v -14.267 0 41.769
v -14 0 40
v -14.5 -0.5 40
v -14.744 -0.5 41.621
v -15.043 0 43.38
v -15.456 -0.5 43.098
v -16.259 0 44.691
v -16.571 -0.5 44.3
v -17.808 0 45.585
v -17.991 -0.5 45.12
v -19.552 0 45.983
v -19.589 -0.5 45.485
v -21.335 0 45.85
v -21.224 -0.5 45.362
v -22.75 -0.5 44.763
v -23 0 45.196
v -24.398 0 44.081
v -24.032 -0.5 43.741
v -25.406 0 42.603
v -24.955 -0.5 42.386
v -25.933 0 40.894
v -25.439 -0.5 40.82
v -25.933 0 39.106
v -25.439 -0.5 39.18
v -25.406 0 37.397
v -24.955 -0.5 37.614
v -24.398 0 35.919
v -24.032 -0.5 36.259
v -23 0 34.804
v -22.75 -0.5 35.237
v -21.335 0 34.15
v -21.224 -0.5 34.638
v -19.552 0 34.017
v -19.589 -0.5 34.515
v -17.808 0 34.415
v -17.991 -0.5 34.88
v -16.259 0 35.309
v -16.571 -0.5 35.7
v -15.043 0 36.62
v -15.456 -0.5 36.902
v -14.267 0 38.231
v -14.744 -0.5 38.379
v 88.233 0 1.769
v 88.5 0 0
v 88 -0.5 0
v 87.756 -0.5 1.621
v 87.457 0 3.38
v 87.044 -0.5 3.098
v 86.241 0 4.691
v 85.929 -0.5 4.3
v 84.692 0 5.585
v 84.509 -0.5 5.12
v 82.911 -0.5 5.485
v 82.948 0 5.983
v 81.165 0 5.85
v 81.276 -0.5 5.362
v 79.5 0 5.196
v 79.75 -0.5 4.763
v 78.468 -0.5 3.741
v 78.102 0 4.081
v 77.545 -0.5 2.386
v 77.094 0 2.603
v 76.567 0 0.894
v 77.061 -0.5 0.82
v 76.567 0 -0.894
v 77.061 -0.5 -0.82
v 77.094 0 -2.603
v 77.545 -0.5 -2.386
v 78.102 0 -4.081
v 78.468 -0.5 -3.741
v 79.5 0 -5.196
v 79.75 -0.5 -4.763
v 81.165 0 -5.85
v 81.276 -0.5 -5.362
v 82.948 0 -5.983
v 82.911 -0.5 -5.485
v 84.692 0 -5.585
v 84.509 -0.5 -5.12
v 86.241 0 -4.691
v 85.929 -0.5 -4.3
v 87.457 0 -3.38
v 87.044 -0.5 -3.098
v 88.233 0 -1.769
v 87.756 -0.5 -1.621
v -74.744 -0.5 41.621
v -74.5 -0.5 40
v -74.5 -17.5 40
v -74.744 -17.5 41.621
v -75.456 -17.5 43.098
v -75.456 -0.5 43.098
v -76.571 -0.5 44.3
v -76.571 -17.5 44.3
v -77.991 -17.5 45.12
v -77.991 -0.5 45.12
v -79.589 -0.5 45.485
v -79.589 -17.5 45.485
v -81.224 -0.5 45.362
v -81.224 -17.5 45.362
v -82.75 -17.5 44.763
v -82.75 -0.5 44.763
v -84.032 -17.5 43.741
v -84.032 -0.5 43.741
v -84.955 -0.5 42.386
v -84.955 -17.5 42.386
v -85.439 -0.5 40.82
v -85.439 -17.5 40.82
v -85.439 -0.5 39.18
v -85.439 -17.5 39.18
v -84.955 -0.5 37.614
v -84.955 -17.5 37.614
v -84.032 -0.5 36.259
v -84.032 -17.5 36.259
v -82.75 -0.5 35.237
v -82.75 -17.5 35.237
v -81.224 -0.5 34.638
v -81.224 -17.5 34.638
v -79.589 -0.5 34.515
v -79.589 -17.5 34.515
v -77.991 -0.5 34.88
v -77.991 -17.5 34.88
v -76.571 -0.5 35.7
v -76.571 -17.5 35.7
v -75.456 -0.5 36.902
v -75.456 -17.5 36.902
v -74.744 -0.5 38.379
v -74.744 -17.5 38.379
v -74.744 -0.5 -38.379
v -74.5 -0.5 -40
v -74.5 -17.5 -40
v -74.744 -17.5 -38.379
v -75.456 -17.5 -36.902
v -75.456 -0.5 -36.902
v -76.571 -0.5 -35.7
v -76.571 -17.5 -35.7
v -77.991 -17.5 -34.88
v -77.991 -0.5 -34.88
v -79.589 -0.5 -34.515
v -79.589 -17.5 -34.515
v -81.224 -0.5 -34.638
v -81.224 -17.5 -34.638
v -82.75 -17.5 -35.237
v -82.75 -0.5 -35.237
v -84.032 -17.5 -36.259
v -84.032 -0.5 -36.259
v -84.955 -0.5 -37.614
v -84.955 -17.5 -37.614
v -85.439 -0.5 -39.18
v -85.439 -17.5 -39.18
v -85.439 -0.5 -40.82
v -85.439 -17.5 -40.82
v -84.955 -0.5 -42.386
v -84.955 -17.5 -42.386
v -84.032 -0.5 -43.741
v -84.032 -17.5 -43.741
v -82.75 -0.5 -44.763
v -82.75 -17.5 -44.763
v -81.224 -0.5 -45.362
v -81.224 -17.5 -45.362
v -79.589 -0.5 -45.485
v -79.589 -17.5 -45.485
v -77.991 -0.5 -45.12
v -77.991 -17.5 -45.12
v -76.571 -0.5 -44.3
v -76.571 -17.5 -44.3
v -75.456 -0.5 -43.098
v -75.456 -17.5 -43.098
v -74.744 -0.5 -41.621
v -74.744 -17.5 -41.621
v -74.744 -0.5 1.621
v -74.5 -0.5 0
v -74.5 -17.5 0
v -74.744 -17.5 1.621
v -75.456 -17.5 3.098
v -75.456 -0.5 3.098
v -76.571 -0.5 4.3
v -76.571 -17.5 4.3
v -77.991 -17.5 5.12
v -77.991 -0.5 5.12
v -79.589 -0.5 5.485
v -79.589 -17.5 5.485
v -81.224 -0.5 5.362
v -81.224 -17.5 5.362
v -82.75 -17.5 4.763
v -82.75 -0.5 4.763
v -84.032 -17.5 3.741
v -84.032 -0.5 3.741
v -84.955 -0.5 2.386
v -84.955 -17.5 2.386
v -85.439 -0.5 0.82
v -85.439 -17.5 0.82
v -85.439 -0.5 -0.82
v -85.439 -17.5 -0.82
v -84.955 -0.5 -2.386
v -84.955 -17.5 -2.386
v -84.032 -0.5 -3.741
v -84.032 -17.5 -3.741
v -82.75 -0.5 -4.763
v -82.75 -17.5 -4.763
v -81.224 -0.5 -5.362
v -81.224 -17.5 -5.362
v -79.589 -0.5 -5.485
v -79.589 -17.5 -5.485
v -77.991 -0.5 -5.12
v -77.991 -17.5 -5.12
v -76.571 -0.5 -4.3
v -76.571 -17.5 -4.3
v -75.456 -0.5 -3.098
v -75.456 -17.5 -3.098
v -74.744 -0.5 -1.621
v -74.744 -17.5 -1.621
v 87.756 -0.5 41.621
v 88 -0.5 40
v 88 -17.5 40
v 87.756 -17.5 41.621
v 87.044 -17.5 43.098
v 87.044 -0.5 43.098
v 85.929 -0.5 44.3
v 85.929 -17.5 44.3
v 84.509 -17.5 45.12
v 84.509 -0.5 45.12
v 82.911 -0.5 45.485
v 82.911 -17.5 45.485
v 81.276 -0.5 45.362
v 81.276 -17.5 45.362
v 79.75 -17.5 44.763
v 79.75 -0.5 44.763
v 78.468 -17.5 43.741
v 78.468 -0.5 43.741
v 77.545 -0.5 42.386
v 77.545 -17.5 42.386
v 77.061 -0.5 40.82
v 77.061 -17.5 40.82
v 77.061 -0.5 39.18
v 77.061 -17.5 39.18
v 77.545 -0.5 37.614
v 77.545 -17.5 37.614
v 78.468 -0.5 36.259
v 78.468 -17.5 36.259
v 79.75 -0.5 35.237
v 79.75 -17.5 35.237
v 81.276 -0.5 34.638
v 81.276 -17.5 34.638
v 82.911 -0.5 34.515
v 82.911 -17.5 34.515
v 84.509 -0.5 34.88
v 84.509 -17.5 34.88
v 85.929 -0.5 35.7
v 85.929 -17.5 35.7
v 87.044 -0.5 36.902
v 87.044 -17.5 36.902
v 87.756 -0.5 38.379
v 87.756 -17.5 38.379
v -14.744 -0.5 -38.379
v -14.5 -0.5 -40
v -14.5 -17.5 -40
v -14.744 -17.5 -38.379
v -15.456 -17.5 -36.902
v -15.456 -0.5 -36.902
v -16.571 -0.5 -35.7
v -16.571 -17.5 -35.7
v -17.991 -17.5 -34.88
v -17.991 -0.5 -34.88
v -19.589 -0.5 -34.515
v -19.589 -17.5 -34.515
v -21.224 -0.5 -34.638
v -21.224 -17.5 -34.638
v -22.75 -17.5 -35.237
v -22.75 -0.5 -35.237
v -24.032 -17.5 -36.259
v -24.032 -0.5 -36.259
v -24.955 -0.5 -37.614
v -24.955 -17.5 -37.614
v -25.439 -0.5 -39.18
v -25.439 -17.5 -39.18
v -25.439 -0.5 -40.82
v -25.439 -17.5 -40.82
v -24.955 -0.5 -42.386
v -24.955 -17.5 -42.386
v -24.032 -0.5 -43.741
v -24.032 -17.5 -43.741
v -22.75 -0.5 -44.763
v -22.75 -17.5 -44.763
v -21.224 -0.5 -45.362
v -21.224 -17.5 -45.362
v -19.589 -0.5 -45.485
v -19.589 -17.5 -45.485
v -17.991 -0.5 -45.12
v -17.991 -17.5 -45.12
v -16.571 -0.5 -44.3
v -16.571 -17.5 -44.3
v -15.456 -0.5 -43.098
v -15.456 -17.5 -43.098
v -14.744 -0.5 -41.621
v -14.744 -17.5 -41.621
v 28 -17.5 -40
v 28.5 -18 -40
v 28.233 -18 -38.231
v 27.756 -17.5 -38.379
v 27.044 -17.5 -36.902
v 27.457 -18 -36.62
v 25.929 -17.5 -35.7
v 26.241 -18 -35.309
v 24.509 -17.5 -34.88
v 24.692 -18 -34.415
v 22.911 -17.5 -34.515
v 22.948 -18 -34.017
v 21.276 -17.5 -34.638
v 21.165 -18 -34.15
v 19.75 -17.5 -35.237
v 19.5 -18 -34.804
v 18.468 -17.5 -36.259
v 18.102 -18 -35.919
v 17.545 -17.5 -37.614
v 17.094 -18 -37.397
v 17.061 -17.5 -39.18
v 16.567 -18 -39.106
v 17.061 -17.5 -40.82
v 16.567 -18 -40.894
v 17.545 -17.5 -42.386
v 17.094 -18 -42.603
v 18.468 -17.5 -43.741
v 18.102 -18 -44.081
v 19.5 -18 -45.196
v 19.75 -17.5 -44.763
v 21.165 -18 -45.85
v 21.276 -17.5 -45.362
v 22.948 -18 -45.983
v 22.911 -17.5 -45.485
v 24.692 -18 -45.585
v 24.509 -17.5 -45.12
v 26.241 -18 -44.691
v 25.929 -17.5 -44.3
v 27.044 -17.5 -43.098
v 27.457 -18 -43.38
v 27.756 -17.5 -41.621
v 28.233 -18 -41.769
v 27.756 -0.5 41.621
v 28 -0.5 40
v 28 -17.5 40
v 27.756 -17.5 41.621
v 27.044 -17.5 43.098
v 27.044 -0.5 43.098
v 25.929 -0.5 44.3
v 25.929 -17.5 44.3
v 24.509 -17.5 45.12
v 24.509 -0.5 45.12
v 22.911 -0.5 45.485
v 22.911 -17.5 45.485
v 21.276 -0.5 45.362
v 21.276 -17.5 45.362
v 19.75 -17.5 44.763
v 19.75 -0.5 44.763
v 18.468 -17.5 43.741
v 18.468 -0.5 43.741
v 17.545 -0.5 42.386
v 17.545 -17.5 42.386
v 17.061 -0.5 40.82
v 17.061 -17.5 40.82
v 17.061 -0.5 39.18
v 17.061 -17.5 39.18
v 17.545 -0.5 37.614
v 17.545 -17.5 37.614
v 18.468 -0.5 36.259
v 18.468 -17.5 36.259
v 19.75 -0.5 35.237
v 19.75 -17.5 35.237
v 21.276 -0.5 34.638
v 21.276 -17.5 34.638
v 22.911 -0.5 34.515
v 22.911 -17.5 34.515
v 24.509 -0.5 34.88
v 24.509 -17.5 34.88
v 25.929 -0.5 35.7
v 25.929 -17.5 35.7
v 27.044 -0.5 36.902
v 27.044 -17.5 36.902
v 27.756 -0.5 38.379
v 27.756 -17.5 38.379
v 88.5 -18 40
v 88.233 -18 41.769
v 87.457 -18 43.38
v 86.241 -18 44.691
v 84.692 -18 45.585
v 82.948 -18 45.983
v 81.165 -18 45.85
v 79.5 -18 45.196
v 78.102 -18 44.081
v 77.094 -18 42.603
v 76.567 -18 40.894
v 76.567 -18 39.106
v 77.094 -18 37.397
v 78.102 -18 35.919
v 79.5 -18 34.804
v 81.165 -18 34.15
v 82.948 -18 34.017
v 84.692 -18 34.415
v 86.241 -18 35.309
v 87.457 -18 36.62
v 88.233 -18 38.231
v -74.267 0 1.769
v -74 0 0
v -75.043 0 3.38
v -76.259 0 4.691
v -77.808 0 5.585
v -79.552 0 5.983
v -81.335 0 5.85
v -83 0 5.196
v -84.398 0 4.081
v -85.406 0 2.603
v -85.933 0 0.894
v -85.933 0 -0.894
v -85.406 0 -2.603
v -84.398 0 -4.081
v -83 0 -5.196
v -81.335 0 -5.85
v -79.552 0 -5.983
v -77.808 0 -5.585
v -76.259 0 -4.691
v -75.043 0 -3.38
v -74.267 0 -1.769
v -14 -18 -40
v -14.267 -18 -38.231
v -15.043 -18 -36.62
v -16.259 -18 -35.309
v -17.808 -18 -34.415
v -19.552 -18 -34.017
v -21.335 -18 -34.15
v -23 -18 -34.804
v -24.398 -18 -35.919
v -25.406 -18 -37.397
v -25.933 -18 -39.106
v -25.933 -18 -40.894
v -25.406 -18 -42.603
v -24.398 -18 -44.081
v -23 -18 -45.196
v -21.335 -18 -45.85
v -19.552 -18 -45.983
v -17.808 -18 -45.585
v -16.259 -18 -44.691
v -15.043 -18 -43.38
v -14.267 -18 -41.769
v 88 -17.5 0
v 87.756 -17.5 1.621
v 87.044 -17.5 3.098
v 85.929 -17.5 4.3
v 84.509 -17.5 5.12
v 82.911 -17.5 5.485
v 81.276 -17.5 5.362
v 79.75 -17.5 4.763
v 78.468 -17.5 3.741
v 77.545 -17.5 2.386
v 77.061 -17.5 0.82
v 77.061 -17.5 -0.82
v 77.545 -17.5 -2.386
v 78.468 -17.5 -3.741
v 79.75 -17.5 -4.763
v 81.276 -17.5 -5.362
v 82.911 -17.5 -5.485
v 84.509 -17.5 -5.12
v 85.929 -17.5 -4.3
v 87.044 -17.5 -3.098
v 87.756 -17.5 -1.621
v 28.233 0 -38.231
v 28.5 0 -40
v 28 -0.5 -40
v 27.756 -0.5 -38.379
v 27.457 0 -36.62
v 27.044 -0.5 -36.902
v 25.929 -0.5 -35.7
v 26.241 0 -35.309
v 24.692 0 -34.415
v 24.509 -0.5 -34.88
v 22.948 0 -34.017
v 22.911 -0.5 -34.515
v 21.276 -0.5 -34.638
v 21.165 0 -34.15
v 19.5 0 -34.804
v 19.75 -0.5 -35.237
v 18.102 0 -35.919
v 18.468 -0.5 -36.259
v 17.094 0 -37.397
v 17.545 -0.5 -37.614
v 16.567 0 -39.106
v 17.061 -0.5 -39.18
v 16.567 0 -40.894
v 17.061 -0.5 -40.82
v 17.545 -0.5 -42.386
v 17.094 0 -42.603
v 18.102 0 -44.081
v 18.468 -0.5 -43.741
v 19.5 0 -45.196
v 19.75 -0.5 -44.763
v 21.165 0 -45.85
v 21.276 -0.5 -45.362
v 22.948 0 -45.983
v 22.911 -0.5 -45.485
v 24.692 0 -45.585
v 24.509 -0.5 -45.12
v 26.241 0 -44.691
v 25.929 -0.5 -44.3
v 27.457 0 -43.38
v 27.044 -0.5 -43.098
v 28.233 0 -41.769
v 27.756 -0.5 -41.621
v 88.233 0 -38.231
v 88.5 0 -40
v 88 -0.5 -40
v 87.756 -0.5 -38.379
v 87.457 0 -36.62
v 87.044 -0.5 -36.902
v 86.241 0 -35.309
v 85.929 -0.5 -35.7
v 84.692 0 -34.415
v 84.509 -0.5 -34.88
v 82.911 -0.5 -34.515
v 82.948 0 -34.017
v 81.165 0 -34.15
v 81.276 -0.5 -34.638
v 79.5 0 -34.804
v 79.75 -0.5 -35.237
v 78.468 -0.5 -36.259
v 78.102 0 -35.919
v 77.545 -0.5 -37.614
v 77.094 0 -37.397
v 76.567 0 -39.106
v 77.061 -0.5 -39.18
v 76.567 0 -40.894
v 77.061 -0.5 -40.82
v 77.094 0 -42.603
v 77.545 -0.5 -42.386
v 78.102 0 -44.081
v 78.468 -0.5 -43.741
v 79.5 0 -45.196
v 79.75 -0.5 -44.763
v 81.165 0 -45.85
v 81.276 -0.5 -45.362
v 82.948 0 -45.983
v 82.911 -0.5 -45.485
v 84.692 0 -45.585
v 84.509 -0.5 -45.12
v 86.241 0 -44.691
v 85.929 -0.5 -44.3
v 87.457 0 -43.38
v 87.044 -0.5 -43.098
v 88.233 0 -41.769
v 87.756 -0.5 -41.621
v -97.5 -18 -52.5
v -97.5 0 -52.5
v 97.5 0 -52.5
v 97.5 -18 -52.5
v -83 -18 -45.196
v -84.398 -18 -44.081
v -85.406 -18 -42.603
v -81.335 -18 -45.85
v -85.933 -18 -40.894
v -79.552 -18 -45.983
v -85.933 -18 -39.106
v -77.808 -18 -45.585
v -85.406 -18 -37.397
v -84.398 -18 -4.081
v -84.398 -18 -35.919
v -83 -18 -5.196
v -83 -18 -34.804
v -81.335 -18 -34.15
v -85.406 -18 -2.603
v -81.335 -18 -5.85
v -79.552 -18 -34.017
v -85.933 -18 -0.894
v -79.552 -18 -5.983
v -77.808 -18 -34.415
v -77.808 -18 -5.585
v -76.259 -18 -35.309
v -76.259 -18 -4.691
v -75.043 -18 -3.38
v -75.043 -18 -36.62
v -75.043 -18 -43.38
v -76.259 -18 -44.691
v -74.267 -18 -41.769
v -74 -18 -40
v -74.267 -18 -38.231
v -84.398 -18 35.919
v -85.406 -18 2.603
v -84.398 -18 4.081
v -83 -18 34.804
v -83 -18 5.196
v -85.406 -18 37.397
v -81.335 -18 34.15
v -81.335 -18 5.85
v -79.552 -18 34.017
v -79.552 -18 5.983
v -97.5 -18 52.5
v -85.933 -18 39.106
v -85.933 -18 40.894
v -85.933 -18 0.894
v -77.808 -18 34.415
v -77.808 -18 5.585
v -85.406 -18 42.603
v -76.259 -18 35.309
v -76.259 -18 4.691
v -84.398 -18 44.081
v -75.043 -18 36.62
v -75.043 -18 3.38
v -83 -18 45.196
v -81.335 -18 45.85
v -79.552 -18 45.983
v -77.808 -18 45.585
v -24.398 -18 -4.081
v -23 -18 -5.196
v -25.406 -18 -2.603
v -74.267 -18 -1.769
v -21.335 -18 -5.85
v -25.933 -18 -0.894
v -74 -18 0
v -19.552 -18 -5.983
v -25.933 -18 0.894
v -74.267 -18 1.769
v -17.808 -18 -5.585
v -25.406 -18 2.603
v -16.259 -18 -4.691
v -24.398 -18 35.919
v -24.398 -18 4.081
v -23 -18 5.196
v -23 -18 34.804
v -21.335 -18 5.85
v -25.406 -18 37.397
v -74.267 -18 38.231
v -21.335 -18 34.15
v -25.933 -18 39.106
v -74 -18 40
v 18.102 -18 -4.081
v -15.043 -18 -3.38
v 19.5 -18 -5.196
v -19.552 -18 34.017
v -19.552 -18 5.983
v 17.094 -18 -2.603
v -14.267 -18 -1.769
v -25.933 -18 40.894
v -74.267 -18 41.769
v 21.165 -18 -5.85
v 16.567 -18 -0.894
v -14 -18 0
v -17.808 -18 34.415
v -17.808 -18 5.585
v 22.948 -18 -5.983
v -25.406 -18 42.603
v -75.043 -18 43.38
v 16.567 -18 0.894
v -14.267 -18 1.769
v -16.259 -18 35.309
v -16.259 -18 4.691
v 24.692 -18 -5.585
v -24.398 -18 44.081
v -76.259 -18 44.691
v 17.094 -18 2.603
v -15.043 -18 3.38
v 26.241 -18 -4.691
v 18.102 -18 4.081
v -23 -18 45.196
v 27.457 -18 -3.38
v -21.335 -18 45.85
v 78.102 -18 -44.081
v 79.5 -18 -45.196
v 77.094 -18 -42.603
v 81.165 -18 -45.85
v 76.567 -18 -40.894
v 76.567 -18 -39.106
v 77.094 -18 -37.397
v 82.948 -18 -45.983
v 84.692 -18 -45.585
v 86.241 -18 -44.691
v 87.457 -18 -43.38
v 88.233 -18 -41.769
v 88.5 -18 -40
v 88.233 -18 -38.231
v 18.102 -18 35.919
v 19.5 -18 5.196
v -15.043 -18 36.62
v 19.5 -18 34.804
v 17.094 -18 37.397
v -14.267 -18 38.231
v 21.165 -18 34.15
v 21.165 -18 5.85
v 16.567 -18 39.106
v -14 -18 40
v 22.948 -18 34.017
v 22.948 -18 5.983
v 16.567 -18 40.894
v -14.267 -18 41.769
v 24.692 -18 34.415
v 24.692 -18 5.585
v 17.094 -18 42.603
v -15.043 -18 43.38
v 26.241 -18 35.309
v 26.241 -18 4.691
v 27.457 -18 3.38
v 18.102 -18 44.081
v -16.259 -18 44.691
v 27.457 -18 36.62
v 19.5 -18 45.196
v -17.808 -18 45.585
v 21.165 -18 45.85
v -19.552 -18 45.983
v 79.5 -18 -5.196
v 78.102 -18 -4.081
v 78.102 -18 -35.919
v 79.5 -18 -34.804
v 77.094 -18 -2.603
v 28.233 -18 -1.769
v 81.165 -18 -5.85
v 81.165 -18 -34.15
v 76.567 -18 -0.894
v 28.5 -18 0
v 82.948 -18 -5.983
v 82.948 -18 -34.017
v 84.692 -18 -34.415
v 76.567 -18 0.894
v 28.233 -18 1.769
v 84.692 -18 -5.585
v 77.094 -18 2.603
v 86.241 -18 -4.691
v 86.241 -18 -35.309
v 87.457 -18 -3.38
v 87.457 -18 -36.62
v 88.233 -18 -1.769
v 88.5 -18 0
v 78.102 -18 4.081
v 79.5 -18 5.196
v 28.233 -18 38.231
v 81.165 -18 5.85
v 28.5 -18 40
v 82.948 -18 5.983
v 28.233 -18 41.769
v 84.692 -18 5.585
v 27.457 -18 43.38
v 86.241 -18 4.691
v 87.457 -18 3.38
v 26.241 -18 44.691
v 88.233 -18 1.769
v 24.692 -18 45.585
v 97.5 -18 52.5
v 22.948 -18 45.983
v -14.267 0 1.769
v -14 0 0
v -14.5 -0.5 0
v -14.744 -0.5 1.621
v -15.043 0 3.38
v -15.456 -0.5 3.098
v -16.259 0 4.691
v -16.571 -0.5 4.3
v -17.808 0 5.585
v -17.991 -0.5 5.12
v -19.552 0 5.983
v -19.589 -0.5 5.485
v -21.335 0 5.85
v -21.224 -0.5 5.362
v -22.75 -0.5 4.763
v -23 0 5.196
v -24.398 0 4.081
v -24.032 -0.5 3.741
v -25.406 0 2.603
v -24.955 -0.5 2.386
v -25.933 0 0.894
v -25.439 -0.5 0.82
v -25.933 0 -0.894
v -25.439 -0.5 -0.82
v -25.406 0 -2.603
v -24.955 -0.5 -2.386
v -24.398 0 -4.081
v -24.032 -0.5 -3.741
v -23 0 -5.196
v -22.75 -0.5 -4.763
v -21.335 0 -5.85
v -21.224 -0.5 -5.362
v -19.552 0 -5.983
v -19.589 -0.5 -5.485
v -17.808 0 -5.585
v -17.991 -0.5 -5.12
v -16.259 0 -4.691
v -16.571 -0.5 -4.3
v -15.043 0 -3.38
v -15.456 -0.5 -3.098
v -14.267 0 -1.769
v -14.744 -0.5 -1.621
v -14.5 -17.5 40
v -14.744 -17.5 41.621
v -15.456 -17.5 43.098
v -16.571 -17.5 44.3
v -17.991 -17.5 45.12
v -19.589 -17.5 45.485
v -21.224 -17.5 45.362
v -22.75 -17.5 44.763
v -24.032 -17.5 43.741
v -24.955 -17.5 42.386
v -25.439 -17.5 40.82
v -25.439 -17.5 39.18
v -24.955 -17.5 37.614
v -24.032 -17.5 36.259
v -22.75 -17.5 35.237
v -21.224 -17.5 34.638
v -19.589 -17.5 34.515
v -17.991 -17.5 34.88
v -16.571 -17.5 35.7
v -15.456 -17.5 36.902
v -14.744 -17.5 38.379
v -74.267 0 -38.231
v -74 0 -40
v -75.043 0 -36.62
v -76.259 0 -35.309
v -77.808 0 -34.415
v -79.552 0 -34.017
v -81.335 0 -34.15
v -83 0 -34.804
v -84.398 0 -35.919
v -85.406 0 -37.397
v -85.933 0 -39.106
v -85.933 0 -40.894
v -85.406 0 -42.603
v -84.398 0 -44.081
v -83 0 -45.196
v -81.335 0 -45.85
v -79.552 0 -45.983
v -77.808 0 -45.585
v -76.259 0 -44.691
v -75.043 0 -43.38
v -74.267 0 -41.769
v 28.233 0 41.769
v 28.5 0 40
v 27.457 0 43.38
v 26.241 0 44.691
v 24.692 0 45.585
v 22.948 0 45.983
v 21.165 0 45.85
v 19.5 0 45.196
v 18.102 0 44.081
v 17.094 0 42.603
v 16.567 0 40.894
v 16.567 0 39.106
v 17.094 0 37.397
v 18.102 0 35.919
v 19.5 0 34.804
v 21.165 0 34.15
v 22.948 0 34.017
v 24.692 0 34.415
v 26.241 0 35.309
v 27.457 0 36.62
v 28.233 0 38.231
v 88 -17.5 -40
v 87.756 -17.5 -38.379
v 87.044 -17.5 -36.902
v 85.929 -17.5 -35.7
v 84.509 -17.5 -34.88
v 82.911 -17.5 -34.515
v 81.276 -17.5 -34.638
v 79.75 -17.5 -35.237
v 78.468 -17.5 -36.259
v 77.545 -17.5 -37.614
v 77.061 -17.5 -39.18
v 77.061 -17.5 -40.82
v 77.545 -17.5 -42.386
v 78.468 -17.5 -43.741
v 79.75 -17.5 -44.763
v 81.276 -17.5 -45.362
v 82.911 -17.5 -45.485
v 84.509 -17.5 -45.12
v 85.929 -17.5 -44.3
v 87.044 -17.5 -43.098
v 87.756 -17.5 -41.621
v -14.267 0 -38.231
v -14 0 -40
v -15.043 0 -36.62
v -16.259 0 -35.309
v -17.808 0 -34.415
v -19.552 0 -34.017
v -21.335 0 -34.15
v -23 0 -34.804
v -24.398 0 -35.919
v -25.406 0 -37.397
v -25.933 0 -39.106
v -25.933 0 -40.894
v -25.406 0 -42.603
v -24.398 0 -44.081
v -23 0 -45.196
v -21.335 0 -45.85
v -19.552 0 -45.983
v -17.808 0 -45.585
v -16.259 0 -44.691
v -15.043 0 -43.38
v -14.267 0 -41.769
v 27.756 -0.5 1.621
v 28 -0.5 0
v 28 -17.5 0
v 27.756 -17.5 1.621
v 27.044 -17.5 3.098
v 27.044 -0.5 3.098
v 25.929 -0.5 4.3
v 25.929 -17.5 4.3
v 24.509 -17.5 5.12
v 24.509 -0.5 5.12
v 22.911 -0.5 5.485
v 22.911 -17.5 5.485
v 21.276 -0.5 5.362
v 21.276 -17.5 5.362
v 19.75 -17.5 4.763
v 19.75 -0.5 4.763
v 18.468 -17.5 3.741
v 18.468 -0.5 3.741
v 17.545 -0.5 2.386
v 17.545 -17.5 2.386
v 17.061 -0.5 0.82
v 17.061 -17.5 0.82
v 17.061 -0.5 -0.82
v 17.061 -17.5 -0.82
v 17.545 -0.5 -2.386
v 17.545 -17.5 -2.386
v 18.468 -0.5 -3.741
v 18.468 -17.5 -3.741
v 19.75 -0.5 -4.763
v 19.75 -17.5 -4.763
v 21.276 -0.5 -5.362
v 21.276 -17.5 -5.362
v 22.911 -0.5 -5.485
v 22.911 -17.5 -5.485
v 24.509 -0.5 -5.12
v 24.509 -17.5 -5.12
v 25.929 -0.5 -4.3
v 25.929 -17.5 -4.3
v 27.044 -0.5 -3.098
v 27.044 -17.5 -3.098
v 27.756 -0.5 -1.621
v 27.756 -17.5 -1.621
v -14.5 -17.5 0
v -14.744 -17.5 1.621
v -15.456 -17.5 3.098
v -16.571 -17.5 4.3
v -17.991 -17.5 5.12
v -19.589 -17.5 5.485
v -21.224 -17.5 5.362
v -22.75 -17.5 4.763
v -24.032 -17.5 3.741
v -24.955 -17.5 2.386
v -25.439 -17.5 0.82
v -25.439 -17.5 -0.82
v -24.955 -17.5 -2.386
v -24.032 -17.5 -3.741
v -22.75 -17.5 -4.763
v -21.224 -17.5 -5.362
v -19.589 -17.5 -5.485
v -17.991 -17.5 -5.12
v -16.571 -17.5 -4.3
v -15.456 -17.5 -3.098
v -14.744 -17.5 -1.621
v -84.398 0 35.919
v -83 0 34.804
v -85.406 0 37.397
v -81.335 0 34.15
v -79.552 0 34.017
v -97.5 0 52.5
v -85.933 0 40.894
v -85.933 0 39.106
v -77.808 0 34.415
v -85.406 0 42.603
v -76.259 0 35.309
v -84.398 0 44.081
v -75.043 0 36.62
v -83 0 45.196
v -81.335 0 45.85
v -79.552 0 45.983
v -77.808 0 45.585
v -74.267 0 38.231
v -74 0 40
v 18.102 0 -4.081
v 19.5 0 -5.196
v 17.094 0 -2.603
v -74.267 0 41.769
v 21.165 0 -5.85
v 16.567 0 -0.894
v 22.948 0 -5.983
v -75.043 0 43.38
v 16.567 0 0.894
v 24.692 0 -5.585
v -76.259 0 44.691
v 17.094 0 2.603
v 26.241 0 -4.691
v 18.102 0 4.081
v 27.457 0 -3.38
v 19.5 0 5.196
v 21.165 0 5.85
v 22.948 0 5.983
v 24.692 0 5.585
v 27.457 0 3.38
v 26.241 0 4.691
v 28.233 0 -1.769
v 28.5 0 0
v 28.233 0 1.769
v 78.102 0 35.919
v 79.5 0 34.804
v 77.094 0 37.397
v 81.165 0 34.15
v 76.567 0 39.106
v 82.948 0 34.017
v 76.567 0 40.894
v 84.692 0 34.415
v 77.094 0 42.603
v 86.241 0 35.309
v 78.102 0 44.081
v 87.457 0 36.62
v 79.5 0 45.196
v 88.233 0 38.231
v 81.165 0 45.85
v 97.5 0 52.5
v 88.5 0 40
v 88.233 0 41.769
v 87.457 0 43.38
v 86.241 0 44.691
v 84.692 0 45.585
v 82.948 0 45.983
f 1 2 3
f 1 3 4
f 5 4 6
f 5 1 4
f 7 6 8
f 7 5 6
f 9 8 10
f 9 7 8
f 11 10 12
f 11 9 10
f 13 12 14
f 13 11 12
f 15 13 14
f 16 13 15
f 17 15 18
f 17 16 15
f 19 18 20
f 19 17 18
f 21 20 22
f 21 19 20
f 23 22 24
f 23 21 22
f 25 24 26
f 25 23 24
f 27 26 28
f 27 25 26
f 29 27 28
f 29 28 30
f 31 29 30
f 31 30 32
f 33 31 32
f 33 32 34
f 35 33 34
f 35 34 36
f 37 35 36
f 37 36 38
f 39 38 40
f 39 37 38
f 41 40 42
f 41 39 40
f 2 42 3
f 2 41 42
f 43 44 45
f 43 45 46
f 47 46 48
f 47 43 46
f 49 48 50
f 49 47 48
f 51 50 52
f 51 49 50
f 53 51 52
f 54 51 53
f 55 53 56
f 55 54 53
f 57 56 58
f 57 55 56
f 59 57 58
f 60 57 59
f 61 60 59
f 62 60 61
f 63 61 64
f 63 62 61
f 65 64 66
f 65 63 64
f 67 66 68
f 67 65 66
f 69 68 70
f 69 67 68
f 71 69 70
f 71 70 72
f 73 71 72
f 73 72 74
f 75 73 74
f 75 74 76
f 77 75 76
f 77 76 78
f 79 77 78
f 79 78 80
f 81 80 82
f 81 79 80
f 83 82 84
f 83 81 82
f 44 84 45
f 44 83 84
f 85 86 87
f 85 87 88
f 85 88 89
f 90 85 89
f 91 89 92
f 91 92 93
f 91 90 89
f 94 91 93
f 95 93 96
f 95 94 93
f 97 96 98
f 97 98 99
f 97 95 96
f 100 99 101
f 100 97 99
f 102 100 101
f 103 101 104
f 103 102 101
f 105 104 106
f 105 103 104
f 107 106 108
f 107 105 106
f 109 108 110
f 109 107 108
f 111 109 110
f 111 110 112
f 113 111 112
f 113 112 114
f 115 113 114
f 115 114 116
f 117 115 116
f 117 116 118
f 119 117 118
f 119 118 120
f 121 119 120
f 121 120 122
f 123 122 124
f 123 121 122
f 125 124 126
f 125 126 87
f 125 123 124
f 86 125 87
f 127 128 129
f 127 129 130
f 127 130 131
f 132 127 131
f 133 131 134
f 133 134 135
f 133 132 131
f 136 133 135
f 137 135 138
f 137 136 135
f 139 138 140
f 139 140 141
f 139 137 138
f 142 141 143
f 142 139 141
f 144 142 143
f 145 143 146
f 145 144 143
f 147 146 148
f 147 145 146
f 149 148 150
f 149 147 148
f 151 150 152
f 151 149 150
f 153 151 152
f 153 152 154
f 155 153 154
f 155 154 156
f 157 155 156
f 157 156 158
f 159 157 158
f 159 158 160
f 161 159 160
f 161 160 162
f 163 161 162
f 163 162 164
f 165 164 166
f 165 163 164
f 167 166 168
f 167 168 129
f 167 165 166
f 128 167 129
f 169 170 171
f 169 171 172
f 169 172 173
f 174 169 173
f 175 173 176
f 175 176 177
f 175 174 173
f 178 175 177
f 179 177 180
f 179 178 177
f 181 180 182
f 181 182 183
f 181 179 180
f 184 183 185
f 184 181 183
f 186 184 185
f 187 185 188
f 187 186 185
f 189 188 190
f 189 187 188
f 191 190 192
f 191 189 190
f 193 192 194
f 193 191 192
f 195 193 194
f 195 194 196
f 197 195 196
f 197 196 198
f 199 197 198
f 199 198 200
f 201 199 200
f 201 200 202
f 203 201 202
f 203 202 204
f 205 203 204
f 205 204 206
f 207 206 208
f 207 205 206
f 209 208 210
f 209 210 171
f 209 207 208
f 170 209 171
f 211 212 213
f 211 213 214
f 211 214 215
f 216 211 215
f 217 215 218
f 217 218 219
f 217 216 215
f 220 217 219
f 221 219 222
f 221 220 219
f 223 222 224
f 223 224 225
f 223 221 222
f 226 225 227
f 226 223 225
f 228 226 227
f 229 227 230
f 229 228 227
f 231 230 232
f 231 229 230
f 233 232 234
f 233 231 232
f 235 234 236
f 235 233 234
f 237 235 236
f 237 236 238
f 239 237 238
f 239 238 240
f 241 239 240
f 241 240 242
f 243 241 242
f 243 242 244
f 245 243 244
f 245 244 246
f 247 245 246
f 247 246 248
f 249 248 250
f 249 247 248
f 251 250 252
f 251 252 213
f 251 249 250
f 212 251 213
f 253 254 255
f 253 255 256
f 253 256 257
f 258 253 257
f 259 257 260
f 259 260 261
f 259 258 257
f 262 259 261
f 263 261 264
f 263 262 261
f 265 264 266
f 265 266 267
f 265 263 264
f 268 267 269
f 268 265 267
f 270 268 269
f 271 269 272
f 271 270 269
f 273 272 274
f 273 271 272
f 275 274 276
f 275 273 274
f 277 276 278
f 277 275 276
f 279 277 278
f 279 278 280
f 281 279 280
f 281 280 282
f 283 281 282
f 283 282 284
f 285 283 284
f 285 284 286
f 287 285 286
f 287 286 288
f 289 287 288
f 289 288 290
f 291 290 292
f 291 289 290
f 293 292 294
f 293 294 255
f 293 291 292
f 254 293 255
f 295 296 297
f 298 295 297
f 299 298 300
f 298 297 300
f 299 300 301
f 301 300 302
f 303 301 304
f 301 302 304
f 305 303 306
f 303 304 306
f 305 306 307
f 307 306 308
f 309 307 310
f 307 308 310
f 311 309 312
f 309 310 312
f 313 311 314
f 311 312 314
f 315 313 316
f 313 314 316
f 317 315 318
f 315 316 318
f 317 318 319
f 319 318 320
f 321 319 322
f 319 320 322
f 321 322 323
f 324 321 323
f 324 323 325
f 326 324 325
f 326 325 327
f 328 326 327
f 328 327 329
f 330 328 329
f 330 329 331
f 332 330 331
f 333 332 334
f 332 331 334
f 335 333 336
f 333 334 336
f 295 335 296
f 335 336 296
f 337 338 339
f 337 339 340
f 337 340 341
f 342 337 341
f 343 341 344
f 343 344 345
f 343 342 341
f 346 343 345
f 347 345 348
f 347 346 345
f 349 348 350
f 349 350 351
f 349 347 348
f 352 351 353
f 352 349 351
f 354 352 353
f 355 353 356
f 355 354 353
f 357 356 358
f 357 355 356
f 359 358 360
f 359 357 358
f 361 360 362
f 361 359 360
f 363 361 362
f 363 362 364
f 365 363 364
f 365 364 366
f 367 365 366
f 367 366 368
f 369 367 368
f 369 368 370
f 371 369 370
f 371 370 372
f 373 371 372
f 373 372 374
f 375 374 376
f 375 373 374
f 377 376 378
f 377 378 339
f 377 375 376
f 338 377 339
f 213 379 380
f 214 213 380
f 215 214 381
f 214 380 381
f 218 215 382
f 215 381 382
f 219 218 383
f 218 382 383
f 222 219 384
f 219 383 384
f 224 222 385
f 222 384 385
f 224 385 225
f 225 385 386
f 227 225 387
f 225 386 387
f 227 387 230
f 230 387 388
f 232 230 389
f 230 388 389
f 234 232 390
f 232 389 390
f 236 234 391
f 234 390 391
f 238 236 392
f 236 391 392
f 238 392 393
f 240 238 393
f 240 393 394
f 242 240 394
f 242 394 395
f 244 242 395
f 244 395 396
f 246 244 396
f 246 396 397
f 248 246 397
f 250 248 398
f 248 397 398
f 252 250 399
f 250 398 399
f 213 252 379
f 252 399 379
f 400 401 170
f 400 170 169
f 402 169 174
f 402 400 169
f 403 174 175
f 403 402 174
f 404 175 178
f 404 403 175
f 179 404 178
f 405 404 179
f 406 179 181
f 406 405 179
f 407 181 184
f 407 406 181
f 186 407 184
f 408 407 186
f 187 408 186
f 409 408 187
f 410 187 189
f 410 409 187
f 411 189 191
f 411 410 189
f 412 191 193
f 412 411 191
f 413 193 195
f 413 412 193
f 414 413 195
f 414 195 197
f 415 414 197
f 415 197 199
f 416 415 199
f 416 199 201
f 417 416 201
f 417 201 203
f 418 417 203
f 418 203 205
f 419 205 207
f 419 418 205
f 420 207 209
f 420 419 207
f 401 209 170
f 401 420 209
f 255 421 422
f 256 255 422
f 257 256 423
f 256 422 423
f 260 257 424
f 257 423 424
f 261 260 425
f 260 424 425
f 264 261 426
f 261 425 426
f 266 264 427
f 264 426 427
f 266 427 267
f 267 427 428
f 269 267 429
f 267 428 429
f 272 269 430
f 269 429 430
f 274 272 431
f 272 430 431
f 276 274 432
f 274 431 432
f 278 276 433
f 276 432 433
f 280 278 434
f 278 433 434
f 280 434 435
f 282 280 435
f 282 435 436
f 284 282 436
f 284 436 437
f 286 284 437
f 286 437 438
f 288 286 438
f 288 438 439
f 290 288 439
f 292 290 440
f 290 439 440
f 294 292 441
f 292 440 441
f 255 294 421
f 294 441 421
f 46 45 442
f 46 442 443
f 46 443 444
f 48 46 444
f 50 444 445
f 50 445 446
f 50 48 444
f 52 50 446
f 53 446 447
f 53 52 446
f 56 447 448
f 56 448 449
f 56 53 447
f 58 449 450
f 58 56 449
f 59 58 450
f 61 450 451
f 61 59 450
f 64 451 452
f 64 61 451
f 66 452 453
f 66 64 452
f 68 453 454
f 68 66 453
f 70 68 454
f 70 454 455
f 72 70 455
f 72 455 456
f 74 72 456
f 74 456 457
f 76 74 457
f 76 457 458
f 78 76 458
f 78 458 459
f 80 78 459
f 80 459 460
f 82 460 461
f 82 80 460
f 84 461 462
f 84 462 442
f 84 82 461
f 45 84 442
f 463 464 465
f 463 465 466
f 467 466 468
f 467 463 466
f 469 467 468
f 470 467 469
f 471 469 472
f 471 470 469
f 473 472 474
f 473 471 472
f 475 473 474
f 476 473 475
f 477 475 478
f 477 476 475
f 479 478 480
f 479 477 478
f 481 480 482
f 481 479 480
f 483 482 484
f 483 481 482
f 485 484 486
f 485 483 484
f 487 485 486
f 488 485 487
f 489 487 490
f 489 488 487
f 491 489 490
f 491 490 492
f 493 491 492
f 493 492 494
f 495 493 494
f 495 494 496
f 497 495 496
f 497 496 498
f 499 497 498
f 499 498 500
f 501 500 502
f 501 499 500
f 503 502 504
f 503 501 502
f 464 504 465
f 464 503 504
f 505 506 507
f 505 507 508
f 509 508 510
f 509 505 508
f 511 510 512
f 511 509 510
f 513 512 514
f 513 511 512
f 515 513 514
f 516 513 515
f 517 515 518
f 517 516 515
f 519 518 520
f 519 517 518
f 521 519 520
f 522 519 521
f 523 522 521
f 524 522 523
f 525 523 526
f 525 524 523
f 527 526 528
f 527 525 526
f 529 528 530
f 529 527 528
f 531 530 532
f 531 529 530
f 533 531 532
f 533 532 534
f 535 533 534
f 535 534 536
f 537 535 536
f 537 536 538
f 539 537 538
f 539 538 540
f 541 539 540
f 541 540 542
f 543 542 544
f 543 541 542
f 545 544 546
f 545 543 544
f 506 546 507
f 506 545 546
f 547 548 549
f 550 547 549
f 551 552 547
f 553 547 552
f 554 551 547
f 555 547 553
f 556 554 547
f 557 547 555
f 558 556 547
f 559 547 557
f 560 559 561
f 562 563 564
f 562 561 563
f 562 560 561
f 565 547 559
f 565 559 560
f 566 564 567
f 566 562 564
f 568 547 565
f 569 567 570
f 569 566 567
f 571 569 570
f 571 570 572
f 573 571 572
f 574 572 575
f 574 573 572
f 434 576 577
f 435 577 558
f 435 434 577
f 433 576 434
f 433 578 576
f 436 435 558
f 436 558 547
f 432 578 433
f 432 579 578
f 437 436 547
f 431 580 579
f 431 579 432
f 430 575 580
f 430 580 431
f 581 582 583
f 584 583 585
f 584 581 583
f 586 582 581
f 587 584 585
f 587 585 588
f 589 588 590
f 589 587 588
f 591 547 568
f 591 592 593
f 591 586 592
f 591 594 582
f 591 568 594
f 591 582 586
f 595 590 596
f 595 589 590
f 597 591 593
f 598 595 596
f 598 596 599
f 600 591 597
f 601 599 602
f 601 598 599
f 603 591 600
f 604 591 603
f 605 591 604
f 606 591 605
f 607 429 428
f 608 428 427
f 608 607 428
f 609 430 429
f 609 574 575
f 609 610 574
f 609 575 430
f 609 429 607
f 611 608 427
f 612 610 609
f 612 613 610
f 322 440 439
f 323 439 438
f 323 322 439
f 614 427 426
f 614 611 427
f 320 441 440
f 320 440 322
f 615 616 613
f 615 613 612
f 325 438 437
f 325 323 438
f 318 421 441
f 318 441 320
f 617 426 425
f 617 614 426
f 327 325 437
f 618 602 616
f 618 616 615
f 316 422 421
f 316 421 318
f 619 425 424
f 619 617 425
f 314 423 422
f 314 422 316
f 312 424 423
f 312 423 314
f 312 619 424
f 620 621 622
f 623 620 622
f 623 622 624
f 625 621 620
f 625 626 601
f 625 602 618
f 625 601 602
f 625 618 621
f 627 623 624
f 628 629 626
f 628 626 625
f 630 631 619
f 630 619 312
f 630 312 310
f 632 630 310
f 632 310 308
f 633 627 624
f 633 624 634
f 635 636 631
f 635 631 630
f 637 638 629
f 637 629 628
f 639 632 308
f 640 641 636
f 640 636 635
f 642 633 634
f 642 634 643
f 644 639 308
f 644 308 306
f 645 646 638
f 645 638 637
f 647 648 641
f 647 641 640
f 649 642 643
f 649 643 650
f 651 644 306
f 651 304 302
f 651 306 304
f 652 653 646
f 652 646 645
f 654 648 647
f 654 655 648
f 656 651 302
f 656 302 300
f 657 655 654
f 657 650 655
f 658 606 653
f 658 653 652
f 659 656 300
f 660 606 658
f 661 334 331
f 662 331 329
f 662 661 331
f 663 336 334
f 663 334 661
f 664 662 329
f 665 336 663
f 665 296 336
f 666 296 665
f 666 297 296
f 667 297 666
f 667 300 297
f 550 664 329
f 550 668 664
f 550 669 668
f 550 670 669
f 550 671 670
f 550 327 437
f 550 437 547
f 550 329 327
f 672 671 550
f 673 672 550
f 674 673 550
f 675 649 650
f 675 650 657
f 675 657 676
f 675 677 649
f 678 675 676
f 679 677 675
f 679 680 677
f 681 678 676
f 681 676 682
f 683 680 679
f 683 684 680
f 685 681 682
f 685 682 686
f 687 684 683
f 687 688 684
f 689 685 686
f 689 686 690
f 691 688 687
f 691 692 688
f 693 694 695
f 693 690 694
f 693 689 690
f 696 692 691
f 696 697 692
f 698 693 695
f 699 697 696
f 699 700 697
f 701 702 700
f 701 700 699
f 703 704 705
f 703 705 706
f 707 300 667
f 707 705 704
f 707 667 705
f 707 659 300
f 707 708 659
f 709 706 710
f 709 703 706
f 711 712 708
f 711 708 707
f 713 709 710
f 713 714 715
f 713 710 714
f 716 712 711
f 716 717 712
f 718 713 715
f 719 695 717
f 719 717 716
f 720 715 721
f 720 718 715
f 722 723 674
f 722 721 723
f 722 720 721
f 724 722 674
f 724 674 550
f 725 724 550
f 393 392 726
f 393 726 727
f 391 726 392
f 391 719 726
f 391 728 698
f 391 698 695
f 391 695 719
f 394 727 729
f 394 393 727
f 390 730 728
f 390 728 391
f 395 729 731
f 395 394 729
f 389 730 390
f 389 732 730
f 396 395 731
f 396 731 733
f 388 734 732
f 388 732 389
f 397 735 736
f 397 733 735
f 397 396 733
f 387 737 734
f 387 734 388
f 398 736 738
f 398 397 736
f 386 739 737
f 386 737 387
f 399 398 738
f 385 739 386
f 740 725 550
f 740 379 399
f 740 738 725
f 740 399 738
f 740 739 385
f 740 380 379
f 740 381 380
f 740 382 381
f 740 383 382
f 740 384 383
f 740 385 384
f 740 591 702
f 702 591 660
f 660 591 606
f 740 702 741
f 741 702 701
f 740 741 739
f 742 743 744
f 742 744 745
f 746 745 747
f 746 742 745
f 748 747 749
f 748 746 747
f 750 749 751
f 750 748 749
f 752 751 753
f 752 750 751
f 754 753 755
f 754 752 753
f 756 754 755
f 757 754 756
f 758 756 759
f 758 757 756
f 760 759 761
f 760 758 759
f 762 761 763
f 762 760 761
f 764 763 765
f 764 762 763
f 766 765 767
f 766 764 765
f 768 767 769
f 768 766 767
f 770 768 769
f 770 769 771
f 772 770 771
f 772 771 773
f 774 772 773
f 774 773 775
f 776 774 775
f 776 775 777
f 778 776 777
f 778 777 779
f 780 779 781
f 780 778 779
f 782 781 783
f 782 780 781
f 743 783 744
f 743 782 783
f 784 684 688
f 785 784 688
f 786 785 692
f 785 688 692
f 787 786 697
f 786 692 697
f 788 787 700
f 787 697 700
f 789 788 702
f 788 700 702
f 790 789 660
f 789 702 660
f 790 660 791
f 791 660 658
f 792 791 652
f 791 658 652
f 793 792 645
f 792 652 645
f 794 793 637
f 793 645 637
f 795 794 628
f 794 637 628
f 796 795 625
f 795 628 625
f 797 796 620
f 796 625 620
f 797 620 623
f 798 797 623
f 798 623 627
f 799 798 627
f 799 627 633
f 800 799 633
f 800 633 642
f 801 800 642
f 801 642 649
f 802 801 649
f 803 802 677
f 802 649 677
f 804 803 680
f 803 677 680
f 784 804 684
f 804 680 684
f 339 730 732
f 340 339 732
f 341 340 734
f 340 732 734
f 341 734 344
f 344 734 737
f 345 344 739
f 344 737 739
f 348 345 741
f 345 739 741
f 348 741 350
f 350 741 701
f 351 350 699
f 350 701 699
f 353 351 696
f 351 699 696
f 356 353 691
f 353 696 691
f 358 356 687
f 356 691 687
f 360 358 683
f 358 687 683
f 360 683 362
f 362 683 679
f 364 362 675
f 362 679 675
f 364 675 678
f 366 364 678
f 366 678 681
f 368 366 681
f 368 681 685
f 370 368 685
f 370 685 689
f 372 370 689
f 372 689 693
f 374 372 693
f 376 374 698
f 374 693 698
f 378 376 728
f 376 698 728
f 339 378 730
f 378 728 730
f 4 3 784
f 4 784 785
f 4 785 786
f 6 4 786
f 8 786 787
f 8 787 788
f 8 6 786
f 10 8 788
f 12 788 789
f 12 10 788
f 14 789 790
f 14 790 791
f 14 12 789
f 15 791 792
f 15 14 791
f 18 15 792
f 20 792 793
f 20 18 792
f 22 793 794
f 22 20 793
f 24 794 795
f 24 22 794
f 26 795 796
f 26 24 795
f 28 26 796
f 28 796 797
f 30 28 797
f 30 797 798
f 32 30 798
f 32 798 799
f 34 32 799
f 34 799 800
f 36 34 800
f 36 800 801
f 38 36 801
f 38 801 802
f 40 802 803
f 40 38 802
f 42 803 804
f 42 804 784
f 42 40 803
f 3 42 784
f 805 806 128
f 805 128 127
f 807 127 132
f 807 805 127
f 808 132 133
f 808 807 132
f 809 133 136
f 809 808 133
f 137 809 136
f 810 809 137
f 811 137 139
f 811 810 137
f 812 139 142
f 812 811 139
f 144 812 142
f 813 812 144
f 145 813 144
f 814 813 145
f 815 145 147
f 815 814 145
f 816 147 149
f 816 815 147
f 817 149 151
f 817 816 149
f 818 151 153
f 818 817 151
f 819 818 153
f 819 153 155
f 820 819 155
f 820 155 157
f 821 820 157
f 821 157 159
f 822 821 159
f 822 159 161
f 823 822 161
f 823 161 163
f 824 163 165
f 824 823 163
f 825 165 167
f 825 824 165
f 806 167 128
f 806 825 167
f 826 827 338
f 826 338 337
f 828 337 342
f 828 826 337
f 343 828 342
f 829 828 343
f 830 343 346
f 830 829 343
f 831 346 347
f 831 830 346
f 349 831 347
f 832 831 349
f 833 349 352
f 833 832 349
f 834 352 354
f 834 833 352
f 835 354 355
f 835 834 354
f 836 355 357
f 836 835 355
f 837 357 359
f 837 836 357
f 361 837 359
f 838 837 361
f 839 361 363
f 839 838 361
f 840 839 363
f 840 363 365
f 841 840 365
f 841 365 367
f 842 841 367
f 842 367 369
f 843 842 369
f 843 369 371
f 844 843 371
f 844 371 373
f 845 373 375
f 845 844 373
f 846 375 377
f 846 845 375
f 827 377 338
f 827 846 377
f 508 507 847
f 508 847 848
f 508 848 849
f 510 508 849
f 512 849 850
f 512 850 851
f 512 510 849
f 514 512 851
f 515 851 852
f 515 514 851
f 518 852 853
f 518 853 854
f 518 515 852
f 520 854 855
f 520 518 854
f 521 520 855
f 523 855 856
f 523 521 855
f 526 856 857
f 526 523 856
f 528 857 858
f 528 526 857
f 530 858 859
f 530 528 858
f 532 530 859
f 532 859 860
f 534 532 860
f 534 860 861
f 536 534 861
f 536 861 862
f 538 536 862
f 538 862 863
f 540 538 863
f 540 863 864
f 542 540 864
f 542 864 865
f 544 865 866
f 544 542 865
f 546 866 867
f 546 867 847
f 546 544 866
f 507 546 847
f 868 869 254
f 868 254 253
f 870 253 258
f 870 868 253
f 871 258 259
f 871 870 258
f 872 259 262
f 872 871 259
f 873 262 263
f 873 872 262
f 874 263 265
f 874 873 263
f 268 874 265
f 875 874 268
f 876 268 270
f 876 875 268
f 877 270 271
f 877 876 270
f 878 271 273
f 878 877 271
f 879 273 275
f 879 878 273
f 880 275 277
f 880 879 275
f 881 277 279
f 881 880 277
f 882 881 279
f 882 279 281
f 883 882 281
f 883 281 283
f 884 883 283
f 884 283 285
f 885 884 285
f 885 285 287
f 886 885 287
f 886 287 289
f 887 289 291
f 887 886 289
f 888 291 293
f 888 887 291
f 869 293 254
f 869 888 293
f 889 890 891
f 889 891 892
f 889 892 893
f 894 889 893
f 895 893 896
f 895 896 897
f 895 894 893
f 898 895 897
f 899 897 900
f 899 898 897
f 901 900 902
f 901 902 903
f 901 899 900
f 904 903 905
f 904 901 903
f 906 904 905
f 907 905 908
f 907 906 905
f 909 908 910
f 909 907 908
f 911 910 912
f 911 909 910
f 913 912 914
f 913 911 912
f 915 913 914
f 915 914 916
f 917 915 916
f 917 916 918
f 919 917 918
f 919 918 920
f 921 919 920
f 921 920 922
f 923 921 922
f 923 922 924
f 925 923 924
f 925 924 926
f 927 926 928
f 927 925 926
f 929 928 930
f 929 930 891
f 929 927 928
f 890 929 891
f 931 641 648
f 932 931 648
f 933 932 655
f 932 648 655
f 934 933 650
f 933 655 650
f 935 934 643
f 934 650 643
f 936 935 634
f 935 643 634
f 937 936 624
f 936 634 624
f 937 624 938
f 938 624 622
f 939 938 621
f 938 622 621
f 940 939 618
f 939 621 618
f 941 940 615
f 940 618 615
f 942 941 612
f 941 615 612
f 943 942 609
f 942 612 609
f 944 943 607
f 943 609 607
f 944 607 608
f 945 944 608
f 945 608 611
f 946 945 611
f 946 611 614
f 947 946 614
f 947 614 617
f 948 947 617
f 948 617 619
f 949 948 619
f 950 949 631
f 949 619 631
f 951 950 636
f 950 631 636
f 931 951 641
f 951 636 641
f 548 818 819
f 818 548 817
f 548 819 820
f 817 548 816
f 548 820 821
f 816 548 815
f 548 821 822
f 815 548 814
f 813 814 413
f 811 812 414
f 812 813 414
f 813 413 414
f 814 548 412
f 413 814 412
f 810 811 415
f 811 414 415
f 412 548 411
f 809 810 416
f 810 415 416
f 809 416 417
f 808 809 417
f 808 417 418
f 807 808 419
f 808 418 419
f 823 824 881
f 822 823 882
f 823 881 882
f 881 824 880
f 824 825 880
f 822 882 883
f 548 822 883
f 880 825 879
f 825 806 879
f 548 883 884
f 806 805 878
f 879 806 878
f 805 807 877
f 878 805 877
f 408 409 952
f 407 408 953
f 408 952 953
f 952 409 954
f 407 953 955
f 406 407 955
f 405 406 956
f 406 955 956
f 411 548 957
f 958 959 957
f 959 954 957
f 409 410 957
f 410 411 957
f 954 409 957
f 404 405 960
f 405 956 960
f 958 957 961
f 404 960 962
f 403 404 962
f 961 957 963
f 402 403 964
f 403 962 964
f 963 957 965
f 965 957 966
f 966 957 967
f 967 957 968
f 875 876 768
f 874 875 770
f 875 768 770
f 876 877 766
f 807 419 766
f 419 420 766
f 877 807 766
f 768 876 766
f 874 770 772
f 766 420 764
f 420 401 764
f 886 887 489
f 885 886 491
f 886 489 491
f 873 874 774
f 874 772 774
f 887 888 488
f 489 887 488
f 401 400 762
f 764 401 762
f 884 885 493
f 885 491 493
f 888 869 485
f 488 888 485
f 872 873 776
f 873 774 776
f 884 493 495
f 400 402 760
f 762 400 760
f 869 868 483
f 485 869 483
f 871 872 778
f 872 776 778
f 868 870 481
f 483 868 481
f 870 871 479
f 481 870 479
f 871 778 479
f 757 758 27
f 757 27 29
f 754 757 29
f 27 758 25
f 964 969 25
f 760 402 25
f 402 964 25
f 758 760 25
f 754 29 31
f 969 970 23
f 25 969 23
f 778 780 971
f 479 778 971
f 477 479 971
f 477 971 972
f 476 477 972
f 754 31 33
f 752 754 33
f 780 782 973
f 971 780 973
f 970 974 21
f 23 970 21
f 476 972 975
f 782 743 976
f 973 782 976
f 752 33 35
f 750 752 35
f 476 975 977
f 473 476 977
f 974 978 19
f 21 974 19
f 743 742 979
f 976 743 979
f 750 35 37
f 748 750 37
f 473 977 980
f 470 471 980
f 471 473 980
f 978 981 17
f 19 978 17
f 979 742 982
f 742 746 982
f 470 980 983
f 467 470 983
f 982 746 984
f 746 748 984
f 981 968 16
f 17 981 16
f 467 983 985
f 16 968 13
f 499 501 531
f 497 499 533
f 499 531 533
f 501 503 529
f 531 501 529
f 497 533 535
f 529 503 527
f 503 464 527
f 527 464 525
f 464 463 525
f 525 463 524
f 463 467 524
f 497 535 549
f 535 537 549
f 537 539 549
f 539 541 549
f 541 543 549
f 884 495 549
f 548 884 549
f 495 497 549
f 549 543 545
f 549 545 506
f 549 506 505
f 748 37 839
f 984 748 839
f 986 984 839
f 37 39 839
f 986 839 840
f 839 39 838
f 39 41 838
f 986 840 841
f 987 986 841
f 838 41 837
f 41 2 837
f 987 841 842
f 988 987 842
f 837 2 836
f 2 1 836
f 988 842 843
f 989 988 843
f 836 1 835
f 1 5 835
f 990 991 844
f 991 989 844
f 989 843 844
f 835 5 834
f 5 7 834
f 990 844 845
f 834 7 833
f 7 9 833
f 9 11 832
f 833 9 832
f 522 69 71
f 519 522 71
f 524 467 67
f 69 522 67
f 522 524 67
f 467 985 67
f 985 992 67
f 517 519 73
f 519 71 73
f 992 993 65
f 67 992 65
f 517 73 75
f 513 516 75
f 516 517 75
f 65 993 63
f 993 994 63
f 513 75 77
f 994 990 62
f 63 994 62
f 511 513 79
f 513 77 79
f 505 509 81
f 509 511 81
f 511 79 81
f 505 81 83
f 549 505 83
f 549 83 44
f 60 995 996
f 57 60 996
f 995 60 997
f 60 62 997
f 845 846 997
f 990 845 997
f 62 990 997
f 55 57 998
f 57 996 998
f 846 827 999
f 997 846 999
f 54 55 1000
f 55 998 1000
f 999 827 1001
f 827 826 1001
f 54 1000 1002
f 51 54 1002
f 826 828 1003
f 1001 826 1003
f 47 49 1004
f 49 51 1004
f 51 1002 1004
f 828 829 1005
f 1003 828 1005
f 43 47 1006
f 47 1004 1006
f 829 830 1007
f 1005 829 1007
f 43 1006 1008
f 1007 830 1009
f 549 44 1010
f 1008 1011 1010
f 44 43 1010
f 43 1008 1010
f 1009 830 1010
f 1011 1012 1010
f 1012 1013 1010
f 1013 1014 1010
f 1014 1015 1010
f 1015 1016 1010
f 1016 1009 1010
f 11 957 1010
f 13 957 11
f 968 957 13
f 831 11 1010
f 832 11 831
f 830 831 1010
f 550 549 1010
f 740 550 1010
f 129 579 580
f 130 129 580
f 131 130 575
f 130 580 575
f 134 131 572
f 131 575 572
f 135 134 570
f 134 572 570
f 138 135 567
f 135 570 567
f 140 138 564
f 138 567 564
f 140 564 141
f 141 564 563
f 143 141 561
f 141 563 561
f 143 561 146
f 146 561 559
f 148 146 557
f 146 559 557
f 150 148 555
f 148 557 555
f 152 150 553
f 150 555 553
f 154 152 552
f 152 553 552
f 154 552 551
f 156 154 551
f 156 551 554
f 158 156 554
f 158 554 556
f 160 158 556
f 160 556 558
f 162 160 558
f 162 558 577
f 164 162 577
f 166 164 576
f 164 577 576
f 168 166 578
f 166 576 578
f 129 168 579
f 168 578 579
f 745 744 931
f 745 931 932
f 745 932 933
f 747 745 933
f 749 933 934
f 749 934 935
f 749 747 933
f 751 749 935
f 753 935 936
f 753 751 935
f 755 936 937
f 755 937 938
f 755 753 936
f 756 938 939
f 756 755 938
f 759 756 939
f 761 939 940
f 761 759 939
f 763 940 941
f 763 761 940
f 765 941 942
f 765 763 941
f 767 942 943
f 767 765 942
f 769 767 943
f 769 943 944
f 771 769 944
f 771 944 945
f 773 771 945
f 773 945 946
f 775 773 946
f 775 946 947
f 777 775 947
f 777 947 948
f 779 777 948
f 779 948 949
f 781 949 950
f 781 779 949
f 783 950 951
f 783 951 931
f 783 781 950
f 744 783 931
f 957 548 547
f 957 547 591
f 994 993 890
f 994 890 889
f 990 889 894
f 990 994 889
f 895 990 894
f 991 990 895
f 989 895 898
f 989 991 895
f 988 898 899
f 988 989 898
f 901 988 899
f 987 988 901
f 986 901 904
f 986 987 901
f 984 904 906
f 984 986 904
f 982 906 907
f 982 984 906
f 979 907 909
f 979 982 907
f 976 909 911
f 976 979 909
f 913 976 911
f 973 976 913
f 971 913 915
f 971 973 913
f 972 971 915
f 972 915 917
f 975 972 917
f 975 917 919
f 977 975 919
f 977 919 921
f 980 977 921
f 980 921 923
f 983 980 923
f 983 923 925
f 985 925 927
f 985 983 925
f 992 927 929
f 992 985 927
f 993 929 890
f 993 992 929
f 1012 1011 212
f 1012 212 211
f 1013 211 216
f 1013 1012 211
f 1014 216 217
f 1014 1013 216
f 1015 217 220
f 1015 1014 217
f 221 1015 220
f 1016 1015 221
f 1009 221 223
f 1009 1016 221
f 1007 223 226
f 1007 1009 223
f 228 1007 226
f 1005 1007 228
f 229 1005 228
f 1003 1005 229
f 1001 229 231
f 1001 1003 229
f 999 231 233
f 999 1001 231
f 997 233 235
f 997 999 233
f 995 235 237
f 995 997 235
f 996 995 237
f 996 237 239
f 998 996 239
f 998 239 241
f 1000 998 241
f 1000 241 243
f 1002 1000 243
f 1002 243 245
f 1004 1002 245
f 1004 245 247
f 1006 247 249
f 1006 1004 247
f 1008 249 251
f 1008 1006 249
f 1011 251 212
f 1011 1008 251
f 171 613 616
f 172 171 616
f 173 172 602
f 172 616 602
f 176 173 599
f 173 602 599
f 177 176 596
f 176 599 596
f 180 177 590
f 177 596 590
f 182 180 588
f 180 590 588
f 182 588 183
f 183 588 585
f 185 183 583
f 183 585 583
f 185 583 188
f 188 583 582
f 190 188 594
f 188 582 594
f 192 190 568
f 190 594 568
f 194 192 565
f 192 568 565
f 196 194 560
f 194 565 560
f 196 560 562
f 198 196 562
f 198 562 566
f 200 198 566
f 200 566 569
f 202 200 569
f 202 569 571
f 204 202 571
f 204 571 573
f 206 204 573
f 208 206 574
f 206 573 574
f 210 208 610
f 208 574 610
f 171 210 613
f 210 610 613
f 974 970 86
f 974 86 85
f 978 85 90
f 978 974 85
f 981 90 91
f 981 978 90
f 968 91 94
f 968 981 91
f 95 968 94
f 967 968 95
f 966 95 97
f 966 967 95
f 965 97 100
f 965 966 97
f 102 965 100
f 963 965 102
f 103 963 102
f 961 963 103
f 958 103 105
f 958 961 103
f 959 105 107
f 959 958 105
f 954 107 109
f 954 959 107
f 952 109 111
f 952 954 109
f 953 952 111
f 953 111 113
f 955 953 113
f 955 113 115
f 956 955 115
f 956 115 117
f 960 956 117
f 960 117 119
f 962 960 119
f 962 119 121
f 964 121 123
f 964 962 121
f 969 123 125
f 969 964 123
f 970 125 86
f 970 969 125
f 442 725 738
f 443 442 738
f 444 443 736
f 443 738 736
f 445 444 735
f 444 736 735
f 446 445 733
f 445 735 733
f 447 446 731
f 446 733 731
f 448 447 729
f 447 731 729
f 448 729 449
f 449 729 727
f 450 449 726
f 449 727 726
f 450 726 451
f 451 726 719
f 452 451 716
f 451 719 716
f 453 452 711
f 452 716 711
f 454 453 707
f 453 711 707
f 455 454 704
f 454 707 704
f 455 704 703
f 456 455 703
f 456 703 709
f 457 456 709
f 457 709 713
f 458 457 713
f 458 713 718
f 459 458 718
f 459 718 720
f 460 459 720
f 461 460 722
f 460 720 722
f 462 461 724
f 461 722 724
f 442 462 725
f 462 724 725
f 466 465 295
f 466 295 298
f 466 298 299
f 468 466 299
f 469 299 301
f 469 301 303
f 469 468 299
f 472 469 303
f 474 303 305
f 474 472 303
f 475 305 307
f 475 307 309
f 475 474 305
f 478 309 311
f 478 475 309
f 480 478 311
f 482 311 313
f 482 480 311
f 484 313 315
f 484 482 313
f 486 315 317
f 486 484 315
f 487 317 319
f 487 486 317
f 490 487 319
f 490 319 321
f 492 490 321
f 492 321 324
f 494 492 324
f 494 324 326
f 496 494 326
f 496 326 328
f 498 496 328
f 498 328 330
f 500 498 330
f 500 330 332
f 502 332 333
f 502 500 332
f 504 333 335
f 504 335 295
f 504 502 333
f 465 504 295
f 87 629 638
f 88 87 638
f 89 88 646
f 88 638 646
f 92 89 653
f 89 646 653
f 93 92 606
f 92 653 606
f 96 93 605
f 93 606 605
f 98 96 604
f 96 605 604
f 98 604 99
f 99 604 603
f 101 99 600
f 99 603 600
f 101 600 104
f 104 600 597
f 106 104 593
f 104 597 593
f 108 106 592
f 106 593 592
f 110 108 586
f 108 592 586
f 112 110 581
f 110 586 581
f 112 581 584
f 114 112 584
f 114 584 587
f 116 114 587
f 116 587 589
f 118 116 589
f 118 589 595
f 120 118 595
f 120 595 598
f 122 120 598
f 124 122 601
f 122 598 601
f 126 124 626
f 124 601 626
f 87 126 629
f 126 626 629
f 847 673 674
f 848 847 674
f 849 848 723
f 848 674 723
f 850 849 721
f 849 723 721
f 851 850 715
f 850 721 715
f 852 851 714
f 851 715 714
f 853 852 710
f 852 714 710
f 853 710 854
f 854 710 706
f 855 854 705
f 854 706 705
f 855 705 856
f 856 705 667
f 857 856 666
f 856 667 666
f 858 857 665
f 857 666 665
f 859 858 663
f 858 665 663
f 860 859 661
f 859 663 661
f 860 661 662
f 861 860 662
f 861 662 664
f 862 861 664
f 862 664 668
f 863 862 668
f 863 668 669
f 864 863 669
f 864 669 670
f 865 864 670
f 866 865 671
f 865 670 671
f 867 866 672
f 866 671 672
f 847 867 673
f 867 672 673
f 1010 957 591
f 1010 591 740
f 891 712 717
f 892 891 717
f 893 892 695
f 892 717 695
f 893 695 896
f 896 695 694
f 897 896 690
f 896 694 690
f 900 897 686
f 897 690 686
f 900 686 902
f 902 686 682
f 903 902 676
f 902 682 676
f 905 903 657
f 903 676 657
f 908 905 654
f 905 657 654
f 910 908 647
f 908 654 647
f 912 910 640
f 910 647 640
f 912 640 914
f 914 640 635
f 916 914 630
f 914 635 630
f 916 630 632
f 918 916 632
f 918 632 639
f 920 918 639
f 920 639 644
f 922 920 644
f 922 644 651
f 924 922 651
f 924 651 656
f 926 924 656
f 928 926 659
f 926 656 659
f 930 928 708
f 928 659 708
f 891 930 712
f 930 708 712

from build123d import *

# Parameters (mm, degrees)
F0_W     = 195
F0_H     = 105
F0_R     = 5.5
F1_DEPTH = 18
F2_SIZE  = 0.5


with BuildPart() as f1:
    # F0 (on Front) → F1 (new body)
    with BuildSketch(Plane.XZ):
        Rectangle(F0_W, F0_H)
        with Locations((-80, -40)):
            Circle(F0_R, mode=Mode.SUBTRACT)
        with Locations((-20, -40)):
            Circle(F0_R, mode=Mode.SUBTRACT)
        with Locations((22.5, -40)):
            Circle(F0_R, mode=Mode.SUBTRACT)
        with Locations((82.5, -40)):
            Circle(F0_R, mode=Mode.SUBTRACT)
        with Locations((-80, 0)):
            Circle(F0_R, mode=Mode.SUBTRACT)
        with Locations((-20, 0)):
            Circle(F0_R, mode=Mode.SUBTRACT)
        with Locations((-80, 40)):
            Circle(F0_R, mode=Mode.SUBTRACT)
        with Locations((-20, 40)):
            Circle(F0_R, mode=Mode.SUBTRACT)
        with Locations((22.5, 0)):
            Circle(F0_R, mode=Mode.SUBTRACT)
        with Locations((82.5, 0)):
            Circle(F0_R, mode=Mode.SUBTRACT)
        with Locations((22.5, 40)):
            Circle(F0_R, mode=Mode.SUBTRACT)
        with Locations((82.5, 40)):
            Circle(F0_R, mode=Mode.SUBTRACT)
    extrude(amount=F1_DEPTH)

    # F2
    f2_edges = [f1.edges().sort_by_distance(p)[0] for p in [
        (-74.5, -9, 40),
        (-85.5, 0, 40),
        (-85.5, -18, 40),
        (-74.5, -9, 0),
        (-85.5, 0, 0),
        (-85.5, -18, 0),
        (-74.5, -9, -40),
        (-85.5, 0, -40),
        (-85.5, -18, -40),
        (-14.5, -9, 40),
        (-25.5, 0, 40),
        (-25.5, -18, 40),
        (-14.5, -9, 0),
        (-25.5, 0, 0),
        (-25.5, -18, 0),
        (-14.5, -9, -40),
        (-25.5, 0, -40),
        (-25.5, -18, -40),
        (28, -9, 40),
        (17, 0, 40),
        (17, -18, 40),
        (28, -9, 0),
        (17, 0, 0),
        (17, -18, 0),
        (28, -9, -40),
        (17, 0, -40),
        (17, -18, -40),
        (88, -9, 40),
        (77, 0, 40),
        (77, -18, 40),
        (88, -9, 0),
        (77, 0, 0),
        (77, -18, 0),
        (88, -9, -40),
        (77, 0, -40),
        (77, -18, -40),
    ]]
    chamfer(f2_edges, length=F2_SIZE)


solid = f1.part
